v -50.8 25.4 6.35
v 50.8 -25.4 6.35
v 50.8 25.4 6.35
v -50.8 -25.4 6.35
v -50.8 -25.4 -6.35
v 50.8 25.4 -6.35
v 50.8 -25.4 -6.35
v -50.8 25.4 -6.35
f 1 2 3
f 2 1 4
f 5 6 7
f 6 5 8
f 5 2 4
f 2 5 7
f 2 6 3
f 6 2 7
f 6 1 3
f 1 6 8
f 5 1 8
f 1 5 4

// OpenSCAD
// ========================================
// a 4 by 2 by 0.5 inch box
// NeuroCAD canonical IR; dimensions are millimetres
// ========================================
$fn = 48;

cube(size=[101.6, 50.8, 12.7], center=true);
